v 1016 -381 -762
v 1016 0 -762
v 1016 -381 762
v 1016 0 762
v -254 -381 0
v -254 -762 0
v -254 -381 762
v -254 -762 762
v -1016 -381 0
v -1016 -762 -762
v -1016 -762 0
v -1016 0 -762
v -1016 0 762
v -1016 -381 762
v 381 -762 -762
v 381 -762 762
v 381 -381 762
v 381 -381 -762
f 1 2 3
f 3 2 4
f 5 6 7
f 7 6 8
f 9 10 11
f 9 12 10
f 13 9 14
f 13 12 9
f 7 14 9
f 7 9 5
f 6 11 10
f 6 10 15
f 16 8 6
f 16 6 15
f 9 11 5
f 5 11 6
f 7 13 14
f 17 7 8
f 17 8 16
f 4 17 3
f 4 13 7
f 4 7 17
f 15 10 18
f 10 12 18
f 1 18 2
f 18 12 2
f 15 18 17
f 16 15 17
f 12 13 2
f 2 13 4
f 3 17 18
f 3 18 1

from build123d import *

# Parameters (mm, degrees)
F0_W      = 2032
F0_H      = 1524
F1_DEPTH  = 381
F2_W      = 1397
F2_H      = 1524
F3_DEPTH  = 381
F4_W      = 762
F4_H      = 762
F5_DEPTH  = 127
F5_FACE_W = 762
F5_FACE_H = 762
F6_DEPTH  = 508


with BuildPart() as f1:
    # F0 (on Front) → F1 (new body)
    with BuildSketch(Plane.XZ):
        Rectangle(F0_W, F0_H)
    extrude(amount=F1_DEPTH)

    # F2 (on face) → F3 (join)
    with BuildSketch(Plane.XZ.offset(381)):
        with Locations((-317.5, 0)):
            Rectangle(F2_W, F2_H)
    extrude(amount=F3_DEPTH)

    # F4 (on face) → F5 (join)
    with BuildSketch(Plane.XZ.offset(762)):
        with Locations((-635, 381)):
            Rectangle(F4_W, F4_H)
    extrude(amount=F5_DEPTH)

    # F5_face (on face) → F6 (cut, through all)
    with BuildSketch(Plane(origin=(-635, -889, 381), x_dir=(1, 0, 0), z_dir=(0, -1, 0))):
        Rectangle(F5_FACE_W, F5_FACE_H)
    extrude(amount=-F6_DEPTH, mode=Mode.SUBTRACT)


solid = f1.part
